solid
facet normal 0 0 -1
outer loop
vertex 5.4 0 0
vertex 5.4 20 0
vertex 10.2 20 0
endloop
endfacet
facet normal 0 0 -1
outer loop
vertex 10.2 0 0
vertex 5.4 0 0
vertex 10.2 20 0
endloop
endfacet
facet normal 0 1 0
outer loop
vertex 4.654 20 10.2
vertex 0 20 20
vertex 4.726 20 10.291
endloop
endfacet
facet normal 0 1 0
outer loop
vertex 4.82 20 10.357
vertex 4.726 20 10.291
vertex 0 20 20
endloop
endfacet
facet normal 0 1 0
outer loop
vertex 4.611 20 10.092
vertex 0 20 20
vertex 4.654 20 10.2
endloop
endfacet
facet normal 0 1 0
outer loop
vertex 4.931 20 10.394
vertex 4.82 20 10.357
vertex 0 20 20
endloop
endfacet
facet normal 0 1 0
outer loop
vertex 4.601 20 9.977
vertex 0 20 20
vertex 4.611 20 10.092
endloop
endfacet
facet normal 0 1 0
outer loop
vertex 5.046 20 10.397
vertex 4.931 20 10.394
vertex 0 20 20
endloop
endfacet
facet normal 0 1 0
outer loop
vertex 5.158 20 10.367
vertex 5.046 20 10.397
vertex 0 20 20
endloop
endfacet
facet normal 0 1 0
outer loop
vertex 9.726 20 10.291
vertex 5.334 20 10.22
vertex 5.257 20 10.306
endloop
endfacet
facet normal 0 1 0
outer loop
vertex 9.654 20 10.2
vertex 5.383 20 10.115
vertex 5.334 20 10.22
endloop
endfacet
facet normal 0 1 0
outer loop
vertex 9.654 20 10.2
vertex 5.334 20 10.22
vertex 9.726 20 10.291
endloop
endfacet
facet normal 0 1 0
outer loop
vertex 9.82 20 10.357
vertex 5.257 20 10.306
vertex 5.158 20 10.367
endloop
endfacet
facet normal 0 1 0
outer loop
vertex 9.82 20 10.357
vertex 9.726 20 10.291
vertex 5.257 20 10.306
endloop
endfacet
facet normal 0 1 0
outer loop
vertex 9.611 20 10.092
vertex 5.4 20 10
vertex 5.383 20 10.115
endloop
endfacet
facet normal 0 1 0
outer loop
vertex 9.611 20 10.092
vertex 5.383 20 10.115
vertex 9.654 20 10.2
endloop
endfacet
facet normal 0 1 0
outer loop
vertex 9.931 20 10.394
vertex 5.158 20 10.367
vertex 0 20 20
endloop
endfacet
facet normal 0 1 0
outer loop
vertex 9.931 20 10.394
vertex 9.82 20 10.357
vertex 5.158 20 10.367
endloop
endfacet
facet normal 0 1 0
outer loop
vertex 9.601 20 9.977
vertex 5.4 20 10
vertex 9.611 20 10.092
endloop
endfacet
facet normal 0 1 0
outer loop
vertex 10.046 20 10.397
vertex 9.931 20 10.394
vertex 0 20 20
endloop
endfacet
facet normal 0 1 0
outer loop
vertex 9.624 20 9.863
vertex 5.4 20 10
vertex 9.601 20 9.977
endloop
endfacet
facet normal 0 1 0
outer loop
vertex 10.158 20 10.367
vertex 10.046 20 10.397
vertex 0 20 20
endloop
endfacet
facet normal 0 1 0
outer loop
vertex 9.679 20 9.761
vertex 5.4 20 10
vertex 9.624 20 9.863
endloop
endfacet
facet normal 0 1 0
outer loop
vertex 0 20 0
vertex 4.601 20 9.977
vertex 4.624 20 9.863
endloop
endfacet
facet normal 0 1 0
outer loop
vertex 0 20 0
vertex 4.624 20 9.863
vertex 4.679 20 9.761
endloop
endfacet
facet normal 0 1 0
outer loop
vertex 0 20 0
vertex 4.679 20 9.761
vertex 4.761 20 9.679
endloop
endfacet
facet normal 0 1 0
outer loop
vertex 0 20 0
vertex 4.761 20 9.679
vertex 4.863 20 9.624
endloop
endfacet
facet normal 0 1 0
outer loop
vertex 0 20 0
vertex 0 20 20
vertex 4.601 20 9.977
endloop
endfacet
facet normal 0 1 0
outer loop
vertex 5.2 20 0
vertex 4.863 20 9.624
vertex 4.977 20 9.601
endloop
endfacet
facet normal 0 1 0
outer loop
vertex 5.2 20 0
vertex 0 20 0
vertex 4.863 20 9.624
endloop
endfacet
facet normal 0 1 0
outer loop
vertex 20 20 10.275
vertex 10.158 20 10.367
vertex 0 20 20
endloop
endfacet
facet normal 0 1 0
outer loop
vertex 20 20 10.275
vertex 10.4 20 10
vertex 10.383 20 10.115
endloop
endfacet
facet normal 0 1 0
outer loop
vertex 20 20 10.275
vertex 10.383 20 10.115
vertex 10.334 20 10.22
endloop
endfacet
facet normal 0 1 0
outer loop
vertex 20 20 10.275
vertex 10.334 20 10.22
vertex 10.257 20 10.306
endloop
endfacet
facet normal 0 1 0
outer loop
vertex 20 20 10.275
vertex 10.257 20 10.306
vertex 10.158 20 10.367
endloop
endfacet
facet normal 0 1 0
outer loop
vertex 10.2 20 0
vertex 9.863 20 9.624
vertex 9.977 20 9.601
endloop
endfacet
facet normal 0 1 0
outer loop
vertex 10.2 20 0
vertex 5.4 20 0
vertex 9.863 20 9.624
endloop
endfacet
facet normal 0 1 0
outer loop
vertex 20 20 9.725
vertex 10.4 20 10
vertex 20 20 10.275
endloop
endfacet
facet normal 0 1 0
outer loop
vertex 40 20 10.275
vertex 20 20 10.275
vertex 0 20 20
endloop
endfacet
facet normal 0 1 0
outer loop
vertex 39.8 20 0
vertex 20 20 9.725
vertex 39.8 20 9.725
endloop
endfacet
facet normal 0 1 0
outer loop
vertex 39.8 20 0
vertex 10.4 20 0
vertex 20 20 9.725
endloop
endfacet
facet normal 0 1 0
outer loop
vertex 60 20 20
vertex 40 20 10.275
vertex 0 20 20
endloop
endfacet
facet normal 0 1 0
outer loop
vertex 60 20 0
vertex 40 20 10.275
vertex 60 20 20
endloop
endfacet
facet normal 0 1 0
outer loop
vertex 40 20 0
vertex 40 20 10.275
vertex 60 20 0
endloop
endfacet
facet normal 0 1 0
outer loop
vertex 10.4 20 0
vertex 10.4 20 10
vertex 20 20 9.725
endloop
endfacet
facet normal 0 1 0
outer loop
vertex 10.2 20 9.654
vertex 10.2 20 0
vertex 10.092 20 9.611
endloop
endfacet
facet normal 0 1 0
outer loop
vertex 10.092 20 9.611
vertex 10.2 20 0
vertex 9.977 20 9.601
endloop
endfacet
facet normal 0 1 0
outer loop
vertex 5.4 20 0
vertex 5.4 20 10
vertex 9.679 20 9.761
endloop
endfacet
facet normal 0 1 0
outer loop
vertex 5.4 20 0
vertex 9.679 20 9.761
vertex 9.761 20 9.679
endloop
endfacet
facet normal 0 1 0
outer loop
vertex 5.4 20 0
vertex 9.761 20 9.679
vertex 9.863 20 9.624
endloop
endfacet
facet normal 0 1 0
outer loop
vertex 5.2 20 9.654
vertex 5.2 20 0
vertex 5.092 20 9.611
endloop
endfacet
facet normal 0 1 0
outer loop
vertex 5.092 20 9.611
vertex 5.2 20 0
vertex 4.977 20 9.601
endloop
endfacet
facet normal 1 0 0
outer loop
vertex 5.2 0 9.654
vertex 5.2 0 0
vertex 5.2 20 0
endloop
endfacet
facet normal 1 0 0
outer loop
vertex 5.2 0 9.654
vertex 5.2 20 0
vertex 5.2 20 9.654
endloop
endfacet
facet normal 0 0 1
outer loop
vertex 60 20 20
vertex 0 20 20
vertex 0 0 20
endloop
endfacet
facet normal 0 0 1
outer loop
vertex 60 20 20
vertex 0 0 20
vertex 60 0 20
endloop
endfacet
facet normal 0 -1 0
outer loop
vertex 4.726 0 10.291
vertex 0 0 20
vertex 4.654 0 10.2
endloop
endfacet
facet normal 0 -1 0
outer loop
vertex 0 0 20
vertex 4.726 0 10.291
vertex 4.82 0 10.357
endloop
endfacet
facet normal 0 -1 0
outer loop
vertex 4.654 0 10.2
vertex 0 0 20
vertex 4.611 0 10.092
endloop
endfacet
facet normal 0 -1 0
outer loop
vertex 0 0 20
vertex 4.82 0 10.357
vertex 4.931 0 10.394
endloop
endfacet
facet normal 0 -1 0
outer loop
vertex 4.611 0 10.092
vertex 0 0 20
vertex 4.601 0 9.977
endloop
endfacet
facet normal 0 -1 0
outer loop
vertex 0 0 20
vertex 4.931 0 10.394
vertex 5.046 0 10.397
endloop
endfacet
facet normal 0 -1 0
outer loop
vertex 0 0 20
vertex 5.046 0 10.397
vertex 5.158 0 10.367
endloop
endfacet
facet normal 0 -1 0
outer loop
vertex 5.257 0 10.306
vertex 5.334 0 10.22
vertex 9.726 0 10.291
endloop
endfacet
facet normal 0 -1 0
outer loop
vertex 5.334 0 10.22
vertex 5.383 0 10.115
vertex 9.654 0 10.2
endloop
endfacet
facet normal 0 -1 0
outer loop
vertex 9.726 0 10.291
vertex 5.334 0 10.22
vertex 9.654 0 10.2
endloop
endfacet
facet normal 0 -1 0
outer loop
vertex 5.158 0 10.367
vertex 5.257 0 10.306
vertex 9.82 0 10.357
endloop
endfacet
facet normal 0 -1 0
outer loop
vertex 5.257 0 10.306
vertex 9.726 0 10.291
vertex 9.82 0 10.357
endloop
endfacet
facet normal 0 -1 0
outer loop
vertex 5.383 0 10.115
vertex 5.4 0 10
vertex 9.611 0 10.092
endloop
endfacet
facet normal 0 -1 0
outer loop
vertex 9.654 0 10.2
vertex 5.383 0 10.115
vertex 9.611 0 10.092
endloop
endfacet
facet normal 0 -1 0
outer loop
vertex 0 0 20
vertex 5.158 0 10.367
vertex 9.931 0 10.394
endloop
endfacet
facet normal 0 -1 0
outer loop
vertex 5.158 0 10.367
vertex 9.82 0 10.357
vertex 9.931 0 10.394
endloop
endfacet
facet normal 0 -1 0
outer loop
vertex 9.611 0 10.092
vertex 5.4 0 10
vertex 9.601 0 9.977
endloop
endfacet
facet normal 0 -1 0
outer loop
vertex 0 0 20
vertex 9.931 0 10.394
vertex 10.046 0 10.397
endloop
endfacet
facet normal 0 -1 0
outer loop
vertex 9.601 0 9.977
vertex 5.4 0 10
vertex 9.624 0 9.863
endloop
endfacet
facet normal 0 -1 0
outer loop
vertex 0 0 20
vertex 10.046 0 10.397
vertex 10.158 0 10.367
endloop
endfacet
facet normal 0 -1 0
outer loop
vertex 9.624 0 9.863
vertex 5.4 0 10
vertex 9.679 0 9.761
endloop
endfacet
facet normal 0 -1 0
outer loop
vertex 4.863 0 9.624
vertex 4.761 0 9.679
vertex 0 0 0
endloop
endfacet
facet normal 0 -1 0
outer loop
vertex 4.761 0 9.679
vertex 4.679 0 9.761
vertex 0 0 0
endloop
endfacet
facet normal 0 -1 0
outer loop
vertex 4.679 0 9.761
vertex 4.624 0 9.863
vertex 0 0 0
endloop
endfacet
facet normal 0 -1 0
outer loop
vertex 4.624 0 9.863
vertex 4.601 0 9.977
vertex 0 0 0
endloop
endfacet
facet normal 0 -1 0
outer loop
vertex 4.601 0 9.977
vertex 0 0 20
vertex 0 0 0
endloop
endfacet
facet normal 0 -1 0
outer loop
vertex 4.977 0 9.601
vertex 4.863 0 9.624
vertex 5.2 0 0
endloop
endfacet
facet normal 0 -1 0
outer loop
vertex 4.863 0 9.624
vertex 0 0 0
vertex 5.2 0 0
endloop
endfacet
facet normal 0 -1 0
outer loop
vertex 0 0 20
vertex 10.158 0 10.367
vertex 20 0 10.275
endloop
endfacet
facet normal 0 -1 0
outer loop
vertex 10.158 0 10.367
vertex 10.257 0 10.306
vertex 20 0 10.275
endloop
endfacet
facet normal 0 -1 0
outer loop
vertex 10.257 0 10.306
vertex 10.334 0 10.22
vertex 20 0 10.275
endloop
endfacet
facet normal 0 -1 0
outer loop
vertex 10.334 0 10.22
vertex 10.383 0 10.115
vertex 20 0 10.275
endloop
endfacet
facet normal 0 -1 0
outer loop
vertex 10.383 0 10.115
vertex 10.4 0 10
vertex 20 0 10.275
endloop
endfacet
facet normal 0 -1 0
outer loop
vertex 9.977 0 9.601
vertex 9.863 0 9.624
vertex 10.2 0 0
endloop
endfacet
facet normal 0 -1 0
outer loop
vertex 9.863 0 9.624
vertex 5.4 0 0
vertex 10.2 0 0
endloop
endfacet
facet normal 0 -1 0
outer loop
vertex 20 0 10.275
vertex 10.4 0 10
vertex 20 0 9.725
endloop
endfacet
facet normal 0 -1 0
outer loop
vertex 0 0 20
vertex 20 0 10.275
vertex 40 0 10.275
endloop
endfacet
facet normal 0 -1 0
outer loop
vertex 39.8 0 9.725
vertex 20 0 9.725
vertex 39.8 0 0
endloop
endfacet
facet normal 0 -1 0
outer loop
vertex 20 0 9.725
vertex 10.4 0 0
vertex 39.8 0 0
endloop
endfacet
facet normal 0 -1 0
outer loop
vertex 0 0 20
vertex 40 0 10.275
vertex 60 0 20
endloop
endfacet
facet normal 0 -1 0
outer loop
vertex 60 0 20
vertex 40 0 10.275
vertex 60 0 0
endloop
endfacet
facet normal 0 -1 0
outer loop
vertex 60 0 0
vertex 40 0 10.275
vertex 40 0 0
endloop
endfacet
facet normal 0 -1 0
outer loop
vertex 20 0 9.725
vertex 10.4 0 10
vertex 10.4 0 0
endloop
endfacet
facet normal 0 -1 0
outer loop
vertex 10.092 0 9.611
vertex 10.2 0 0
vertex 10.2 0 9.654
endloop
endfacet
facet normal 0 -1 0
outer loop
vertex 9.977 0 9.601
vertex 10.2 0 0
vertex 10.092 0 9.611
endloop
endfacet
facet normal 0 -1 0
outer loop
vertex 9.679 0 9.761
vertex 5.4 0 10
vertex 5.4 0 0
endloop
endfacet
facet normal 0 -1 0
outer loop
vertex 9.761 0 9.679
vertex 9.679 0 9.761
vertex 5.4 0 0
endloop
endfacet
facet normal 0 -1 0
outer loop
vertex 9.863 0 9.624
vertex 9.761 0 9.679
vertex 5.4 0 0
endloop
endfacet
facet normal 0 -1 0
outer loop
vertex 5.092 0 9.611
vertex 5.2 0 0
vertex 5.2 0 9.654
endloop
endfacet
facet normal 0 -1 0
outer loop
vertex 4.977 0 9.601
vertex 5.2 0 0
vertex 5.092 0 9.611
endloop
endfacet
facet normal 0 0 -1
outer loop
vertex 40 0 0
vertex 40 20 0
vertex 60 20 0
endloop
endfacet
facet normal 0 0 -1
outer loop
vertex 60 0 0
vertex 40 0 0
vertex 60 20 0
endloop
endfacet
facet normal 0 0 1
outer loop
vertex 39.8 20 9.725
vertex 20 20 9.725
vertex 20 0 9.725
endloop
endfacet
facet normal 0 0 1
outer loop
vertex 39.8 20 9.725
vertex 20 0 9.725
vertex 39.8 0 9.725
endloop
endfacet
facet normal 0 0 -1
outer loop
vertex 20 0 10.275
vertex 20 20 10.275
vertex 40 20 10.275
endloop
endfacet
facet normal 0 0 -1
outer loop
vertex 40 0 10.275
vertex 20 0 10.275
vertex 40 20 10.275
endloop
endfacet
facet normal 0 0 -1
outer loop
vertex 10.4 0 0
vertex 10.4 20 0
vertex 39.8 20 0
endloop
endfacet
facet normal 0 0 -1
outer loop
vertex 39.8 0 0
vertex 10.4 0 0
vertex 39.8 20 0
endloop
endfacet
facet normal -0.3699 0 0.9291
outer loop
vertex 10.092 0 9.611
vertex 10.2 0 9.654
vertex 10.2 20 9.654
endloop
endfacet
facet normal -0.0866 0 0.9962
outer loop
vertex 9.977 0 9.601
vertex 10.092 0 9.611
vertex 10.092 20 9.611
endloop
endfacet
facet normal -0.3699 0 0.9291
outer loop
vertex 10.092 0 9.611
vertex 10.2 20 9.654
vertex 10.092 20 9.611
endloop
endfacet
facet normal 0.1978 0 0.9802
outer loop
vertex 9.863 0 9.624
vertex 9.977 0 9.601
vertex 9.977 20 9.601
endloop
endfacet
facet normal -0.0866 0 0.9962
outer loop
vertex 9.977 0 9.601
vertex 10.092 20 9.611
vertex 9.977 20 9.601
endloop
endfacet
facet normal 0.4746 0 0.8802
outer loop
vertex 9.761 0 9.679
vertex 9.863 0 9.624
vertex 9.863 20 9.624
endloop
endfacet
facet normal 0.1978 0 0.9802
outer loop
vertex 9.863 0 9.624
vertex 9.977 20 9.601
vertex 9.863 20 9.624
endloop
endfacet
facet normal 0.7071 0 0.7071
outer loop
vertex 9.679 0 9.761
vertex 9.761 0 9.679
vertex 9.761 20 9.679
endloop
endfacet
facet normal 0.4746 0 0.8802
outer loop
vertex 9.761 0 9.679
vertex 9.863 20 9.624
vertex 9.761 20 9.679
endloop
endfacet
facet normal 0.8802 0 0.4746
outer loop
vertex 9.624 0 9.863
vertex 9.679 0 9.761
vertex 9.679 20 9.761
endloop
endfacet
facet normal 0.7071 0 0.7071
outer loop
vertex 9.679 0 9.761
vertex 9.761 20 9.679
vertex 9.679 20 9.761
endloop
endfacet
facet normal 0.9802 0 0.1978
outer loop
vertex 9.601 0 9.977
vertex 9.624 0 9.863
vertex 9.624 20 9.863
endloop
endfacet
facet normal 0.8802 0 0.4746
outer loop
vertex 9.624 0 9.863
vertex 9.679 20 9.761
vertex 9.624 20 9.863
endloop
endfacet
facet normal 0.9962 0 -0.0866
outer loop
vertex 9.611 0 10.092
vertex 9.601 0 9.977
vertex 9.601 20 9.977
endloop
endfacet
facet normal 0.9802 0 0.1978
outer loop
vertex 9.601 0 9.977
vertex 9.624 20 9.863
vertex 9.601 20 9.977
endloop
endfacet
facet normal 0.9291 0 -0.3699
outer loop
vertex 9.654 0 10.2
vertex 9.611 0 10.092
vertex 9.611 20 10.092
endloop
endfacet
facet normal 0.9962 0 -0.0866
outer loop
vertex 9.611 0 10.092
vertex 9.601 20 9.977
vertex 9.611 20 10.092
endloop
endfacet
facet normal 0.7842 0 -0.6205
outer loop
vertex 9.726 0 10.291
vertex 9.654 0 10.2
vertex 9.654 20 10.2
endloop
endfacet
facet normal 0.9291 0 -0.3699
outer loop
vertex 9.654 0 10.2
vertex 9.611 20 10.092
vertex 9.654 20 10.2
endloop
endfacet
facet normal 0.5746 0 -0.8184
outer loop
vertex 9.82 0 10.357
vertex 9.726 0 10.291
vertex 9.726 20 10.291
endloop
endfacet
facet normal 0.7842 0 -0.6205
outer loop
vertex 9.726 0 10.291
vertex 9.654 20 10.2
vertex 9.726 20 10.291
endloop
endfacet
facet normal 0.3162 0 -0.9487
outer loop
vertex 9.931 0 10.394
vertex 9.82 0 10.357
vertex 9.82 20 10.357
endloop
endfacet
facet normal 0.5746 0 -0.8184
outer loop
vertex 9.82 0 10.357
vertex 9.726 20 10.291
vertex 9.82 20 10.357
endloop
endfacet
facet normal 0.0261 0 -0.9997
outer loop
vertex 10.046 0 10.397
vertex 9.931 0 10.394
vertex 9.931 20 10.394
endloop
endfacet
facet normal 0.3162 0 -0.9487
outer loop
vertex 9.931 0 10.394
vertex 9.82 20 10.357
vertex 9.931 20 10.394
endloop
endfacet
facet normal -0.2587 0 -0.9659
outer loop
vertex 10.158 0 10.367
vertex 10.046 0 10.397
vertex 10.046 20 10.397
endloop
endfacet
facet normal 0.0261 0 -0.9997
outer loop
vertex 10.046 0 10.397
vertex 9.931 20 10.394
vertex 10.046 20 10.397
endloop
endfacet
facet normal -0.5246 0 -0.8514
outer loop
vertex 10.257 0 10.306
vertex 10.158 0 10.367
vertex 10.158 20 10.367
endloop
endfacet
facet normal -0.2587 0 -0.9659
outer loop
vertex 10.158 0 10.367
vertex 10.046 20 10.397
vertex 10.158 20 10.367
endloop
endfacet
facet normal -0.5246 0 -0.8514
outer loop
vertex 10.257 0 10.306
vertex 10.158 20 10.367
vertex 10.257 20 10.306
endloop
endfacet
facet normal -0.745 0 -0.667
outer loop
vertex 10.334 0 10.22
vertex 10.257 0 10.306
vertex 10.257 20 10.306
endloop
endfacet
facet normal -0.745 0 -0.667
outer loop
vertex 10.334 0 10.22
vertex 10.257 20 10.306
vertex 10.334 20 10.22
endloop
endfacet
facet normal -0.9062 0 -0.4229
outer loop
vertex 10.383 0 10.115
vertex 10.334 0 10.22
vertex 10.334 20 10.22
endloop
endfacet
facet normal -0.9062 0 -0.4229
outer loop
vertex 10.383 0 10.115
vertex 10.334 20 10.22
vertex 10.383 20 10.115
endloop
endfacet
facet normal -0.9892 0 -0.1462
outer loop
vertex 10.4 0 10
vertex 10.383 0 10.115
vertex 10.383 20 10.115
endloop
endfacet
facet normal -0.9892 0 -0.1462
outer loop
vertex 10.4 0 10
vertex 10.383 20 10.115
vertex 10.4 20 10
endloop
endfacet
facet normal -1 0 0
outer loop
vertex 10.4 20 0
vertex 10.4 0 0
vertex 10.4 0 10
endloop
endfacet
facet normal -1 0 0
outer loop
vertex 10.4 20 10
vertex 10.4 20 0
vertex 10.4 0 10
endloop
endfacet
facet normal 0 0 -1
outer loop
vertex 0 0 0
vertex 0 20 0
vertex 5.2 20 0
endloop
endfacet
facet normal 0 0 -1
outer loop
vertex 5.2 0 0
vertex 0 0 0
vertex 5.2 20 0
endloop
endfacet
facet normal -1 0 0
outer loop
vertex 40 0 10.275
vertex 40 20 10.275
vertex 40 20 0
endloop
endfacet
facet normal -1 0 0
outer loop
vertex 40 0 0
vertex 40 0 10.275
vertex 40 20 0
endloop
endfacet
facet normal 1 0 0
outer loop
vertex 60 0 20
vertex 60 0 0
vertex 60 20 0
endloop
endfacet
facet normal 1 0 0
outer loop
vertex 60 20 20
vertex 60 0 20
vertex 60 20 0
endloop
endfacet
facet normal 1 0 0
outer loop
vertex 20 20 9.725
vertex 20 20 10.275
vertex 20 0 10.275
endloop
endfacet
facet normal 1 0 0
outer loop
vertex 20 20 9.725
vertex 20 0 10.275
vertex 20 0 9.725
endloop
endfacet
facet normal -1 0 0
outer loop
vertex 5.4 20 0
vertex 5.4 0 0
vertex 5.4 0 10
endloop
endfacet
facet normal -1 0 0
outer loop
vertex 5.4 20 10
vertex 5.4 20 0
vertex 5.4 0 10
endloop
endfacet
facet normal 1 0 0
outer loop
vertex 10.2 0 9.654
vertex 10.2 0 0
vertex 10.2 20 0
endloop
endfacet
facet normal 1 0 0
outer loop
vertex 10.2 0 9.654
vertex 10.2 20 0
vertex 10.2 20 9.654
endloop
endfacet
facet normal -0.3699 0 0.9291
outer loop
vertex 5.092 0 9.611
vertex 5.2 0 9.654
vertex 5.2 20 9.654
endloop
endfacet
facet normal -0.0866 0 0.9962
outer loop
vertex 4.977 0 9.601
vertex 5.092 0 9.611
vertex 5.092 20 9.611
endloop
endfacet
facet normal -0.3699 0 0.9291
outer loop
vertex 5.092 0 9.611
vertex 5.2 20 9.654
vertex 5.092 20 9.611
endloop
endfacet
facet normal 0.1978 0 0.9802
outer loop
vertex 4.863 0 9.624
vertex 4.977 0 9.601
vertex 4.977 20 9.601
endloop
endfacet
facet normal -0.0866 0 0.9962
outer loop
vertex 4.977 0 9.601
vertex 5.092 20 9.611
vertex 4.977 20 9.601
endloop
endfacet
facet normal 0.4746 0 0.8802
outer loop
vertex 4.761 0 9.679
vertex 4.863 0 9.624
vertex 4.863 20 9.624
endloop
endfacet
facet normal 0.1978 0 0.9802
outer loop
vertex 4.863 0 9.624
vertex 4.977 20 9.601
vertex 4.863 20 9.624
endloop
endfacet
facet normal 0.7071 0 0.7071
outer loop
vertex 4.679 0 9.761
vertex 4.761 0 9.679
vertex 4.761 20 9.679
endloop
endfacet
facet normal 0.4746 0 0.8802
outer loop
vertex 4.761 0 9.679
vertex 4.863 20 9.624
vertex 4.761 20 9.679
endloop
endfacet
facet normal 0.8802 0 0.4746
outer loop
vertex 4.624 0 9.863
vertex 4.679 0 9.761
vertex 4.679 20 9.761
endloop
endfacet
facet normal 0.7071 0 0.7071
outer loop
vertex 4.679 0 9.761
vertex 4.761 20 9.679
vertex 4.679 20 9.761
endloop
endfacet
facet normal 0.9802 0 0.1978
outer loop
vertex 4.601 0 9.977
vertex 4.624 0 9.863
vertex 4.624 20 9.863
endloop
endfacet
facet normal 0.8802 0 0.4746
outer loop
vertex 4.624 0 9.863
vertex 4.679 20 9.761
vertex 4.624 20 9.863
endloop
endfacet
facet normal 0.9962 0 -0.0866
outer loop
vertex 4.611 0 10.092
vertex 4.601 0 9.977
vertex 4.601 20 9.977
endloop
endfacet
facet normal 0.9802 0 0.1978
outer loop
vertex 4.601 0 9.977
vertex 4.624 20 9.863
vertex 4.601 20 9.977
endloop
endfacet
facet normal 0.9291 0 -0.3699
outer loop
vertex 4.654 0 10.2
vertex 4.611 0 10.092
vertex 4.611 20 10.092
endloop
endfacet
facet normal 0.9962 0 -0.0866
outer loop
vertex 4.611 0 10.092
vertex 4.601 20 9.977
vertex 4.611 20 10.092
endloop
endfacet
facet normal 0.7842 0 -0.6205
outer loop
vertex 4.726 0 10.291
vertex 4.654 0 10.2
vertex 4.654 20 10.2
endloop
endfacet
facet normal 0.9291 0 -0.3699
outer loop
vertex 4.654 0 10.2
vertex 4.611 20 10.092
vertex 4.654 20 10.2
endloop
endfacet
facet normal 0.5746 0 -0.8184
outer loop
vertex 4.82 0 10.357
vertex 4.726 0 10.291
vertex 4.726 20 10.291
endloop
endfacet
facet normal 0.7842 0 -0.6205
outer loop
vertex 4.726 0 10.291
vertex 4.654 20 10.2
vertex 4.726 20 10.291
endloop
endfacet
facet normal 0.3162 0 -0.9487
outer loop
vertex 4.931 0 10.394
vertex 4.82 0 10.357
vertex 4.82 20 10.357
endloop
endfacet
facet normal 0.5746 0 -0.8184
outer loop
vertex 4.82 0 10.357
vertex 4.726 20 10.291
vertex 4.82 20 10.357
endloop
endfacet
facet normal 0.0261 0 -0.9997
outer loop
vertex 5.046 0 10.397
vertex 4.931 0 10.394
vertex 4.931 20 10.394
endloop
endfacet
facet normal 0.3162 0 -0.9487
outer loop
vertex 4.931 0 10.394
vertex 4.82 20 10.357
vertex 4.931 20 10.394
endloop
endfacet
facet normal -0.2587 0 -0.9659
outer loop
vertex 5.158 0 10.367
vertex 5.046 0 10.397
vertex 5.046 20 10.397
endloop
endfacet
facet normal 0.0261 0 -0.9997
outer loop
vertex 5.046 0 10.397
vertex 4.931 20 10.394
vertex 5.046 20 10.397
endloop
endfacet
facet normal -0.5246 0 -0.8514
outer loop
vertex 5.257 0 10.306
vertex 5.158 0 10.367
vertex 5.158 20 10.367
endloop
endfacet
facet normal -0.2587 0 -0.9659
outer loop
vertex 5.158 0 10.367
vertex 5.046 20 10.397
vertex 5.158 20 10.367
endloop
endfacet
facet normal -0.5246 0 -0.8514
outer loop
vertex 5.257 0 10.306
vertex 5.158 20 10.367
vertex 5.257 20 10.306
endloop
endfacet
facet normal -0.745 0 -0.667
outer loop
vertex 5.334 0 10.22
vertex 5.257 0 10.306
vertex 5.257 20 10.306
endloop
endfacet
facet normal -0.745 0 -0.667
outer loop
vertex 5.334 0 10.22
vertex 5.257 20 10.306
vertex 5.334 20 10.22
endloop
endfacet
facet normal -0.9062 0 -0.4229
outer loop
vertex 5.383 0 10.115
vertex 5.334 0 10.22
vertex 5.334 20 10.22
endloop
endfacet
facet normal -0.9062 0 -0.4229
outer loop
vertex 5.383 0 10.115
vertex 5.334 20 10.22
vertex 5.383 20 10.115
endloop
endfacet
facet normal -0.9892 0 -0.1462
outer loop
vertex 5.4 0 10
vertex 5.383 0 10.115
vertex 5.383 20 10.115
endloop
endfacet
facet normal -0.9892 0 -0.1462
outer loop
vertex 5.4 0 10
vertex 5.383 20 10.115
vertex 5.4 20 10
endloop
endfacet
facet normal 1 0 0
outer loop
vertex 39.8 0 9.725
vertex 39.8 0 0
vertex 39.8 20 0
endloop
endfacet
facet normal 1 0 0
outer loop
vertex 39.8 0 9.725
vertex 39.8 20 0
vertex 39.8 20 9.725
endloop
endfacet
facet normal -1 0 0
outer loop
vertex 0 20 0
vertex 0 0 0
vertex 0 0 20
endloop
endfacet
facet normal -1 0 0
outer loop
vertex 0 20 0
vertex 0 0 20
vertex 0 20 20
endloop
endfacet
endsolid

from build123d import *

# Parameters (mm, degrees)
SKETCH_1_W          = 60
SKETCH_1_H          = 20
EXTRUDE_1_DEPTH     = 20
SKETCH_2_W          = 20
SKETCH_2_H          = 0.55
CUT_EXTRUDE_1_DEPTH = 67.332495807
SKETCH_3_R          = 0.4
CUT_EXTRUDE_2_DEPTH = 67.332495807
SKETCH_4_W          = 0.2
SKETCH_4_H          = 10
SKETCH_4_H_2        = 9.725
CUT_EXTRUDE_3_DEPTH = 67.332495807


with BuildPart() as part:
    # 草图1 → 凸台-拉伸1 (new body)
    with BuildSketch(Plane.XY):
        with Locations((30, 10)):
            Rectangle(SKETCH_1_W, SKETCH_1_H)
    extrude(amount=EXTRUDE_1_DEPTH)

    # 草图2 → 切除-拉伸1 (cut, through all)
    with BuildSketch(Plane(origin=(0, 20, 0), x_dir=(1, 0, 0), z_dir=(0, 1, 0))):
        with Locations((30, -10)):
            Rectangle(SKETCH_2_W, SKETCH_2_H)
    extrude(amount=-CUT_EXTRUDE_1_DEPTH, mode=Mode.SUBTRACT)

    # 草图3 → 切除-拉伸2 (cut, through all)
    with BuildSketch(Plane(origin=(0, 20, 0), x_dir=(1, 0, 0), z_dir=(0, 1, 0))):
        with Locations(Location((5, -10, 0), (0, 0, 270))):
            Circle(SKETCH_3_R)
        with Locations(Location((10, -10, 0), (0, 0, 270))):
            Circle(SKETCH_3_R)
    extrude(amount=-CUT_EXTRUDE_2_DEPTH, mode=Mode.SUBTRACT)

    # 草图4 → 切除-拉伸3 (cut, through all)
    with BuildSketch(Plane.XZ):
        with Locations((5.3, 5)):
            Rectangle(SKETCH_4_W, SKETCH_4_H)
        with Locations((10.3, 5)):
            Rectangle(SKETCH_4_W, SKETCH_4_H)
        with Locations((39.9, 4.8625)):
            Rectangle(SKETCH_4_W, SKETCH_4_H_2)
    extrude(amount=-CUT_EXTRUDE_3_DEPTH, mode=Mode.SUBTRACT)


solid = part.part
